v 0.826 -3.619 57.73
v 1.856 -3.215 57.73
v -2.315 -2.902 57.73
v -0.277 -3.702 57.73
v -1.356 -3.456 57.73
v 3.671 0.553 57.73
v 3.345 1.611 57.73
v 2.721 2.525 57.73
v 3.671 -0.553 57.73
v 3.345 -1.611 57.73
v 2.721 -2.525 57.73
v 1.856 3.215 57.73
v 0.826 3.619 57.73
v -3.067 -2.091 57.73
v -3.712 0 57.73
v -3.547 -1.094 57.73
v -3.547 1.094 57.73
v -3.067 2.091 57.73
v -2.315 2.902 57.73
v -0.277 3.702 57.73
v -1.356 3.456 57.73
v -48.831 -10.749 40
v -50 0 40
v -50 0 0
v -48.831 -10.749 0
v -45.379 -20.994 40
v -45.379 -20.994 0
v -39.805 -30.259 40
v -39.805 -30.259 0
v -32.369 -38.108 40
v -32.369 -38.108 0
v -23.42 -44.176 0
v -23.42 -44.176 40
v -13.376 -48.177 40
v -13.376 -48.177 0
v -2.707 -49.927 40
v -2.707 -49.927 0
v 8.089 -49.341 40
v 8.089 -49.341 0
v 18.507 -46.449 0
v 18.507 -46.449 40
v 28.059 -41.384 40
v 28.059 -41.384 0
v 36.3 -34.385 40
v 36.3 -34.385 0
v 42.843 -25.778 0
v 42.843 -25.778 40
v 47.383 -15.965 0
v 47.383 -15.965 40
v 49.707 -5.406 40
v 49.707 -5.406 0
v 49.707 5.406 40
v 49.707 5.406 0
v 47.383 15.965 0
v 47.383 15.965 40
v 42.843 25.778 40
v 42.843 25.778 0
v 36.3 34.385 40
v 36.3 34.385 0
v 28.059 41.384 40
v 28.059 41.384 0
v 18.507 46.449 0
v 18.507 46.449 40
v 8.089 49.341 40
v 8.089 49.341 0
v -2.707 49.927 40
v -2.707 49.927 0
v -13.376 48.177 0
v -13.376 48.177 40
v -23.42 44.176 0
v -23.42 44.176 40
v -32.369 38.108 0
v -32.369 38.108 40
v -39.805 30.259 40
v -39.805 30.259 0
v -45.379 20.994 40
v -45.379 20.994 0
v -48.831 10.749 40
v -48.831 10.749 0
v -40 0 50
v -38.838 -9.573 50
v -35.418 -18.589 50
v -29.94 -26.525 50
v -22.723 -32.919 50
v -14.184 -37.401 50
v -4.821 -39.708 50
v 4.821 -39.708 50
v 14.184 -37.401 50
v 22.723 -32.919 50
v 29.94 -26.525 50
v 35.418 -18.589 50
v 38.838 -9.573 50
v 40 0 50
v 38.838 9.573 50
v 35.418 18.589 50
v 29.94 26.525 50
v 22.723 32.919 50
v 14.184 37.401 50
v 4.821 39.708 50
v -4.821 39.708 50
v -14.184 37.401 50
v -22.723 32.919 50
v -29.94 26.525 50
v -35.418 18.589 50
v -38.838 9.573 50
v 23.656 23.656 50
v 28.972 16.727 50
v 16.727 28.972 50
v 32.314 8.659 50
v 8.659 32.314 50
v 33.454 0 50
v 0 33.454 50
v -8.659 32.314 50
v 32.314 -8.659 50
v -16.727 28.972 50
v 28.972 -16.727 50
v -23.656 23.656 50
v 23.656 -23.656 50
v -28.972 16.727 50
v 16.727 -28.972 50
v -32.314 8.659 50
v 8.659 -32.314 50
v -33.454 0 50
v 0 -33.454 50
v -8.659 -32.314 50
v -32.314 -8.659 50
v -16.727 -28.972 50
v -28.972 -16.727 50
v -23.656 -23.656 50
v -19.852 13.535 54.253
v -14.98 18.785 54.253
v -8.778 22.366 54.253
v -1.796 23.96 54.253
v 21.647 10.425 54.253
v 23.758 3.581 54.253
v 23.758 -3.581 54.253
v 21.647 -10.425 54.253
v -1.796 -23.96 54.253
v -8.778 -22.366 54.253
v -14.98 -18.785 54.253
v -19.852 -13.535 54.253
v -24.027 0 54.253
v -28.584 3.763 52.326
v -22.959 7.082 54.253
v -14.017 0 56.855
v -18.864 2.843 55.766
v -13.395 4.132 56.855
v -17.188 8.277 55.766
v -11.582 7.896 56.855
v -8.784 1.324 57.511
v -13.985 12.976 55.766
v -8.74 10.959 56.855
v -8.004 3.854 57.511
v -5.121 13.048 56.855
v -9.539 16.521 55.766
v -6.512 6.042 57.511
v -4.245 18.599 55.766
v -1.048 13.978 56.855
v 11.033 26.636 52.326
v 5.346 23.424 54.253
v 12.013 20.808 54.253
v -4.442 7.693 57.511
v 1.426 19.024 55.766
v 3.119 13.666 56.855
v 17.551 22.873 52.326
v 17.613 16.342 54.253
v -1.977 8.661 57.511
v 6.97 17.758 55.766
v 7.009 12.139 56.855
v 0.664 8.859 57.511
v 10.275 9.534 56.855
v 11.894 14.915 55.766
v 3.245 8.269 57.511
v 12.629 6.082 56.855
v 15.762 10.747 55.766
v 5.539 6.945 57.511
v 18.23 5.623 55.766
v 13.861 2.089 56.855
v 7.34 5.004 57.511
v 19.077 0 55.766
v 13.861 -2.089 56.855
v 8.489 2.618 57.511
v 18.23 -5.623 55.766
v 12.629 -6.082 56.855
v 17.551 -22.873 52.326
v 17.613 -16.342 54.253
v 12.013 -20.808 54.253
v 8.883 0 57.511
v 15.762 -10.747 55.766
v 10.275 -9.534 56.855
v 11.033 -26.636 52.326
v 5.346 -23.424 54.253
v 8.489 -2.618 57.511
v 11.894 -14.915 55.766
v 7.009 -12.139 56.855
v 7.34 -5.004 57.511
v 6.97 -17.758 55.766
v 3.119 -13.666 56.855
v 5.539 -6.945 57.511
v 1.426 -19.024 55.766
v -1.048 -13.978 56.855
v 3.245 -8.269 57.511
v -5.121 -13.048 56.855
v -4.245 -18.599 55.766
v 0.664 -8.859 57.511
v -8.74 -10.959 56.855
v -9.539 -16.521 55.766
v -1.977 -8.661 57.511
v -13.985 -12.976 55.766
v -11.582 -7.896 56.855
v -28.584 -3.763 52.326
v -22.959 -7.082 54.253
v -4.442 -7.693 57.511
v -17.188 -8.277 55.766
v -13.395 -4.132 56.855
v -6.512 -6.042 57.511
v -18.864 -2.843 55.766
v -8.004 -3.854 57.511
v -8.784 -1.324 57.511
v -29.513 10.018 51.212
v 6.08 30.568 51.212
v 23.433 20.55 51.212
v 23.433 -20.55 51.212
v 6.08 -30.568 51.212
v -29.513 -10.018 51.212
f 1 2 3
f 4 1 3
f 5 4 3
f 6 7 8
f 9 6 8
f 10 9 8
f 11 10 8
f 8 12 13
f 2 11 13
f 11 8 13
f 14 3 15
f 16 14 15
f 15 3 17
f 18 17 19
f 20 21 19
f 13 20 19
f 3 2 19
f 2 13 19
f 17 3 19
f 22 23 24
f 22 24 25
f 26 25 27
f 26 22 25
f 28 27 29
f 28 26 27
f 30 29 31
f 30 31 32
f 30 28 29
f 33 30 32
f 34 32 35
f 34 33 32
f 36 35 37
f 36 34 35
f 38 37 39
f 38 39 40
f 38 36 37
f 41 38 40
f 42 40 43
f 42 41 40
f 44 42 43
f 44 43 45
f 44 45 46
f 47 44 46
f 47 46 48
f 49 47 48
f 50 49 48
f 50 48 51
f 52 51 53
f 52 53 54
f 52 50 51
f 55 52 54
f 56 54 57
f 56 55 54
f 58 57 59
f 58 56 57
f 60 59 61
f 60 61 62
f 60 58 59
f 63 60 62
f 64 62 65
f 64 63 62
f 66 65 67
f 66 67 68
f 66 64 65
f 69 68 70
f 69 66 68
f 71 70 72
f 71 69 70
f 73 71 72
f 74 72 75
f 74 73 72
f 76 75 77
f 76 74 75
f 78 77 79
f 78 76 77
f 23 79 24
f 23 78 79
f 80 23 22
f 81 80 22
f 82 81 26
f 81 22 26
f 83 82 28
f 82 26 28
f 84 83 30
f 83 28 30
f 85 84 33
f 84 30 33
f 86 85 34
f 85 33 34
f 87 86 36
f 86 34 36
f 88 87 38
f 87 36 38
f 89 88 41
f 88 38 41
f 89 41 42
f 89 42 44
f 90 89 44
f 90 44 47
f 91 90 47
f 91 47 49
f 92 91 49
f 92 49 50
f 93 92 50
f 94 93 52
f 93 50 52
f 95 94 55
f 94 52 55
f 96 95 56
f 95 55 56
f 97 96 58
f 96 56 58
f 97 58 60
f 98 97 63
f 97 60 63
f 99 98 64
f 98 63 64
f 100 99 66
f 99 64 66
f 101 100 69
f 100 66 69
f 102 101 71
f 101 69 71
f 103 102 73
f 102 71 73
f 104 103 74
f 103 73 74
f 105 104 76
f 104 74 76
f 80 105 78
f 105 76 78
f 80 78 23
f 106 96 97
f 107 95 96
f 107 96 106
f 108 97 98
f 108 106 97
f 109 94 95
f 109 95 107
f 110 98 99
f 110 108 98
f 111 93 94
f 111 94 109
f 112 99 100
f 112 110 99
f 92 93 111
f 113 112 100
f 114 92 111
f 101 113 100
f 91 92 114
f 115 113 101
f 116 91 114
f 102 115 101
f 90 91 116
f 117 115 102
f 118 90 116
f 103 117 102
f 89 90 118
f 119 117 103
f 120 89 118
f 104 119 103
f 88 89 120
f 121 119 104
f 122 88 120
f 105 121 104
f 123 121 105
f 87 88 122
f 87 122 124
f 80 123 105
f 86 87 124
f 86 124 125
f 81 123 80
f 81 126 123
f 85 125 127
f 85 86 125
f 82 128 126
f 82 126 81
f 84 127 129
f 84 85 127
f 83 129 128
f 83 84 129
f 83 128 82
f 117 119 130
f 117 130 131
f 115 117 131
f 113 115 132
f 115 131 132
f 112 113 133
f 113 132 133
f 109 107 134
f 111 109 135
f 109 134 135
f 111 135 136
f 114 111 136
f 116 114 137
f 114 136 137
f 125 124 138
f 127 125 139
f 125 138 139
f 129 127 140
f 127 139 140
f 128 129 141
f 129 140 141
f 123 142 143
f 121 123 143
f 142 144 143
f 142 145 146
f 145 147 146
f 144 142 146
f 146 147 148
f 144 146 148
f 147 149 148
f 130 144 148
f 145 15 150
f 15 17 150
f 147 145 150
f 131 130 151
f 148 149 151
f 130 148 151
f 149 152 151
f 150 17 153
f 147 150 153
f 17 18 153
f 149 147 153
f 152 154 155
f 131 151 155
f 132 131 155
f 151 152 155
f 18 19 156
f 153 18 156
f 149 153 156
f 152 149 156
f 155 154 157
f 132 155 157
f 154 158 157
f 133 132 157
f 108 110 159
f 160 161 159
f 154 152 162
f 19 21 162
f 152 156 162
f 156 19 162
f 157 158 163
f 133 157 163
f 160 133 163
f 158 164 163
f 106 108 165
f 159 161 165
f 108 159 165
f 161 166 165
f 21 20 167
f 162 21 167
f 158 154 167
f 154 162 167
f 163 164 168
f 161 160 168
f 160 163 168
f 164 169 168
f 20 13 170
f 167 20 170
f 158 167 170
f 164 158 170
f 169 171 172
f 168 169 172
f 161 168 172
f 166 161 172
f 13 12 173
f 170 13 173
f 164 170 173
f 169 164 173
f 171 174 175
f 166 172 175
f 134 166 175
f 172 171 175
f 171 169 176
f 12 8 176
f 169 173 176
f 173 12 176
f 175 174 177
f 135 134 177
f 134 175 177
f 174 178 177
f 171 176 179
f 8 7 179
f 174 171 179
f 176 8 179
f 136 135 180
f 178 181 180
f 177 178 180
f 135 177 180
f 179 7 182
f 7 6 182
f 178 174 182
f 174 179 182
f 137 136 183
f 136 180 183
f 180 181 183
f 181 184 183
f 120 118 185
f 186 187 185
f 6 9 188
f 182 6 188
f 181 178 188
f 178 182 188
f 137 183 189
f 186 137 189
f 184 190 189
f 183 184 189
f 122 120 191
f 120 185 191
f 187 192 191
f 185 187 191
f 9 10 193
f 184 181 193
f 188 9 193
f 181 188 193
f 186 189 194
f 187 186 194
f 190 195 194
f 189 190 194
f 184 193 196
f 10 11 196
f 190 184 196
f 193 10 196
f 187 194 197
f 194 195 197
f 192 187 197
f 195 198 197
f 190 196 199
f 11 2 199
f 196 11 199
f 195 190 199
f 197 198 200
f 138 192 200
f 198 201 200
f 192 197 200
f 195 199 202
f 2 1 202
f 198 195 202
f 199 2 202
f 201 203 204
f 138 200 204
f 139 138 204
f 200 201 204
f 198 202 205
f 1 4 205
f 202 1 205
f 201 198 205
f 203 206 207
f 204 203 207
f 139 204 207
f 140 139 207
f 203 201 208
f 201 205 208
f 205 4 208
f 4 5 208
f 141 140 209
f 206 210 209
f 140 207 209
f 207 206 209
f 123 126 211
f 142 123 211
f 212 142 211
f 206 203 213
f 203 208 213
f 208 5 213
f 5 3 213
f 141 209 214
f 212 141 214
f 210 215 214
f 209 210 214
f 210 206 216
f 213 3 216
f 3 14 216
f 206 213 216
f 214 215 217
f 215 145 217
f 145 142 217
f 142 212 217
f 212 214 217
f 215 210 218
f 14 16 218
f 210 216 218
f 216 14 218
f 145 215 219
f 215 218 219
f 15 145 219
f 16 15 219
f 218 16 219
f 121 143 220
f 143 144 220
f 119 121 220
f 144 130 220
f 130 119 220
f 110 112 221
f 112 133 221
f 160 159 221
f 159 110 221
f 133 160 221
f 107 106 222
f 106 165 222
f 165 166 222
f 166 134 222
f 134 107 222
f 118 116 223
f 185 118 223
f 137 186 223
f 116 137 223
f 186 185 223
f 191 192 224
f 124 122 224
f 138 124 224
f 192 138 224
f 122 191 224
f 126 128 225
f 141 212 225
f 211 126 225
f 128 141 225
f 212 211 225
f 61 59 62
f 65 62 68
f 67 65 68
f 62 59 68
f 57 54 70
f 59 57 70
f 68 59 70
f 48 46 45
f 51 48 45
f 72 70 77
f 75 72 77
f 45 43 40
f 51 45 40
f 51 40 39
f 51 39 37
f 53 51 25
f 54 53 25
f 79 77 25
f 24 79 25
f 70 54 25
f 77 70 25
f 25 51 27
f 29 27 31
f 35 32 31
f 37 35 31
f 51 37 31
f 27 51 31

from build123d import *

# Parameters (mm, degrees)
F0_W    = 50
F0_H    = 50
F2_W    = 33.4539487958
F2_H    = 22.2039483488
F5_SIZE = 10


# Not quite as in the source:
# - a fillet or chamfer that OpenCascade refuses, or shapes differently, is made with other operations: its cross-section is extruded or revolved along the edge and cut away or added


with BuildPart() as f1:
    # F0 (on Front) → F1 (revolve)
    with BuildSketch(Plane.XZ):
        with Locations((-25, 25)):
            Rectangle(F0_W, F0_H)
    revolve(axis=Axis((0, 0, 25), (0, 0, 1)))

    # F2 (on Front) → F3 (revolve)
    with BuildSketch(Plane.XZ):
        with Locations((-16.7269743979, 46.6282907873)):
            Rectangle(F2_W, F2_H)
    revolve(axis=Axis((0, 0, 50), (0, 0, -1)))

    # F4: fillet of radius 61.079603128 on 1 edges, made by hand

    # F4_s1 → F4_t2 (revolve, cut)
    with BuildSketch(Plane.XZ):
        with BuildLine():
            ThreePointArc((-33.4539487958, 50), (-19.0772136264, 55.7661180216), (-3.7122939075, 57.7302649617))
            Line((-3.7122939075, 57.7302649617), (-33.4539487958, 57.7302649617))
            Line((-33.4539487958, 57.7302649617), (-33.4539487958, 50))
        make_face()
    revolve(axis=Axis((0, 0, 57.7302649617), (0, 0, -1)), mode=Mode.SUBTRACT)

    # F5
    f5_edges = [f1.edges().sort_by_distance(p)[0] for p in [
        (50, 0, 50),
    ]]
    chamfer(f5_edges, length=F5_SIZE)


solid = f1.part
